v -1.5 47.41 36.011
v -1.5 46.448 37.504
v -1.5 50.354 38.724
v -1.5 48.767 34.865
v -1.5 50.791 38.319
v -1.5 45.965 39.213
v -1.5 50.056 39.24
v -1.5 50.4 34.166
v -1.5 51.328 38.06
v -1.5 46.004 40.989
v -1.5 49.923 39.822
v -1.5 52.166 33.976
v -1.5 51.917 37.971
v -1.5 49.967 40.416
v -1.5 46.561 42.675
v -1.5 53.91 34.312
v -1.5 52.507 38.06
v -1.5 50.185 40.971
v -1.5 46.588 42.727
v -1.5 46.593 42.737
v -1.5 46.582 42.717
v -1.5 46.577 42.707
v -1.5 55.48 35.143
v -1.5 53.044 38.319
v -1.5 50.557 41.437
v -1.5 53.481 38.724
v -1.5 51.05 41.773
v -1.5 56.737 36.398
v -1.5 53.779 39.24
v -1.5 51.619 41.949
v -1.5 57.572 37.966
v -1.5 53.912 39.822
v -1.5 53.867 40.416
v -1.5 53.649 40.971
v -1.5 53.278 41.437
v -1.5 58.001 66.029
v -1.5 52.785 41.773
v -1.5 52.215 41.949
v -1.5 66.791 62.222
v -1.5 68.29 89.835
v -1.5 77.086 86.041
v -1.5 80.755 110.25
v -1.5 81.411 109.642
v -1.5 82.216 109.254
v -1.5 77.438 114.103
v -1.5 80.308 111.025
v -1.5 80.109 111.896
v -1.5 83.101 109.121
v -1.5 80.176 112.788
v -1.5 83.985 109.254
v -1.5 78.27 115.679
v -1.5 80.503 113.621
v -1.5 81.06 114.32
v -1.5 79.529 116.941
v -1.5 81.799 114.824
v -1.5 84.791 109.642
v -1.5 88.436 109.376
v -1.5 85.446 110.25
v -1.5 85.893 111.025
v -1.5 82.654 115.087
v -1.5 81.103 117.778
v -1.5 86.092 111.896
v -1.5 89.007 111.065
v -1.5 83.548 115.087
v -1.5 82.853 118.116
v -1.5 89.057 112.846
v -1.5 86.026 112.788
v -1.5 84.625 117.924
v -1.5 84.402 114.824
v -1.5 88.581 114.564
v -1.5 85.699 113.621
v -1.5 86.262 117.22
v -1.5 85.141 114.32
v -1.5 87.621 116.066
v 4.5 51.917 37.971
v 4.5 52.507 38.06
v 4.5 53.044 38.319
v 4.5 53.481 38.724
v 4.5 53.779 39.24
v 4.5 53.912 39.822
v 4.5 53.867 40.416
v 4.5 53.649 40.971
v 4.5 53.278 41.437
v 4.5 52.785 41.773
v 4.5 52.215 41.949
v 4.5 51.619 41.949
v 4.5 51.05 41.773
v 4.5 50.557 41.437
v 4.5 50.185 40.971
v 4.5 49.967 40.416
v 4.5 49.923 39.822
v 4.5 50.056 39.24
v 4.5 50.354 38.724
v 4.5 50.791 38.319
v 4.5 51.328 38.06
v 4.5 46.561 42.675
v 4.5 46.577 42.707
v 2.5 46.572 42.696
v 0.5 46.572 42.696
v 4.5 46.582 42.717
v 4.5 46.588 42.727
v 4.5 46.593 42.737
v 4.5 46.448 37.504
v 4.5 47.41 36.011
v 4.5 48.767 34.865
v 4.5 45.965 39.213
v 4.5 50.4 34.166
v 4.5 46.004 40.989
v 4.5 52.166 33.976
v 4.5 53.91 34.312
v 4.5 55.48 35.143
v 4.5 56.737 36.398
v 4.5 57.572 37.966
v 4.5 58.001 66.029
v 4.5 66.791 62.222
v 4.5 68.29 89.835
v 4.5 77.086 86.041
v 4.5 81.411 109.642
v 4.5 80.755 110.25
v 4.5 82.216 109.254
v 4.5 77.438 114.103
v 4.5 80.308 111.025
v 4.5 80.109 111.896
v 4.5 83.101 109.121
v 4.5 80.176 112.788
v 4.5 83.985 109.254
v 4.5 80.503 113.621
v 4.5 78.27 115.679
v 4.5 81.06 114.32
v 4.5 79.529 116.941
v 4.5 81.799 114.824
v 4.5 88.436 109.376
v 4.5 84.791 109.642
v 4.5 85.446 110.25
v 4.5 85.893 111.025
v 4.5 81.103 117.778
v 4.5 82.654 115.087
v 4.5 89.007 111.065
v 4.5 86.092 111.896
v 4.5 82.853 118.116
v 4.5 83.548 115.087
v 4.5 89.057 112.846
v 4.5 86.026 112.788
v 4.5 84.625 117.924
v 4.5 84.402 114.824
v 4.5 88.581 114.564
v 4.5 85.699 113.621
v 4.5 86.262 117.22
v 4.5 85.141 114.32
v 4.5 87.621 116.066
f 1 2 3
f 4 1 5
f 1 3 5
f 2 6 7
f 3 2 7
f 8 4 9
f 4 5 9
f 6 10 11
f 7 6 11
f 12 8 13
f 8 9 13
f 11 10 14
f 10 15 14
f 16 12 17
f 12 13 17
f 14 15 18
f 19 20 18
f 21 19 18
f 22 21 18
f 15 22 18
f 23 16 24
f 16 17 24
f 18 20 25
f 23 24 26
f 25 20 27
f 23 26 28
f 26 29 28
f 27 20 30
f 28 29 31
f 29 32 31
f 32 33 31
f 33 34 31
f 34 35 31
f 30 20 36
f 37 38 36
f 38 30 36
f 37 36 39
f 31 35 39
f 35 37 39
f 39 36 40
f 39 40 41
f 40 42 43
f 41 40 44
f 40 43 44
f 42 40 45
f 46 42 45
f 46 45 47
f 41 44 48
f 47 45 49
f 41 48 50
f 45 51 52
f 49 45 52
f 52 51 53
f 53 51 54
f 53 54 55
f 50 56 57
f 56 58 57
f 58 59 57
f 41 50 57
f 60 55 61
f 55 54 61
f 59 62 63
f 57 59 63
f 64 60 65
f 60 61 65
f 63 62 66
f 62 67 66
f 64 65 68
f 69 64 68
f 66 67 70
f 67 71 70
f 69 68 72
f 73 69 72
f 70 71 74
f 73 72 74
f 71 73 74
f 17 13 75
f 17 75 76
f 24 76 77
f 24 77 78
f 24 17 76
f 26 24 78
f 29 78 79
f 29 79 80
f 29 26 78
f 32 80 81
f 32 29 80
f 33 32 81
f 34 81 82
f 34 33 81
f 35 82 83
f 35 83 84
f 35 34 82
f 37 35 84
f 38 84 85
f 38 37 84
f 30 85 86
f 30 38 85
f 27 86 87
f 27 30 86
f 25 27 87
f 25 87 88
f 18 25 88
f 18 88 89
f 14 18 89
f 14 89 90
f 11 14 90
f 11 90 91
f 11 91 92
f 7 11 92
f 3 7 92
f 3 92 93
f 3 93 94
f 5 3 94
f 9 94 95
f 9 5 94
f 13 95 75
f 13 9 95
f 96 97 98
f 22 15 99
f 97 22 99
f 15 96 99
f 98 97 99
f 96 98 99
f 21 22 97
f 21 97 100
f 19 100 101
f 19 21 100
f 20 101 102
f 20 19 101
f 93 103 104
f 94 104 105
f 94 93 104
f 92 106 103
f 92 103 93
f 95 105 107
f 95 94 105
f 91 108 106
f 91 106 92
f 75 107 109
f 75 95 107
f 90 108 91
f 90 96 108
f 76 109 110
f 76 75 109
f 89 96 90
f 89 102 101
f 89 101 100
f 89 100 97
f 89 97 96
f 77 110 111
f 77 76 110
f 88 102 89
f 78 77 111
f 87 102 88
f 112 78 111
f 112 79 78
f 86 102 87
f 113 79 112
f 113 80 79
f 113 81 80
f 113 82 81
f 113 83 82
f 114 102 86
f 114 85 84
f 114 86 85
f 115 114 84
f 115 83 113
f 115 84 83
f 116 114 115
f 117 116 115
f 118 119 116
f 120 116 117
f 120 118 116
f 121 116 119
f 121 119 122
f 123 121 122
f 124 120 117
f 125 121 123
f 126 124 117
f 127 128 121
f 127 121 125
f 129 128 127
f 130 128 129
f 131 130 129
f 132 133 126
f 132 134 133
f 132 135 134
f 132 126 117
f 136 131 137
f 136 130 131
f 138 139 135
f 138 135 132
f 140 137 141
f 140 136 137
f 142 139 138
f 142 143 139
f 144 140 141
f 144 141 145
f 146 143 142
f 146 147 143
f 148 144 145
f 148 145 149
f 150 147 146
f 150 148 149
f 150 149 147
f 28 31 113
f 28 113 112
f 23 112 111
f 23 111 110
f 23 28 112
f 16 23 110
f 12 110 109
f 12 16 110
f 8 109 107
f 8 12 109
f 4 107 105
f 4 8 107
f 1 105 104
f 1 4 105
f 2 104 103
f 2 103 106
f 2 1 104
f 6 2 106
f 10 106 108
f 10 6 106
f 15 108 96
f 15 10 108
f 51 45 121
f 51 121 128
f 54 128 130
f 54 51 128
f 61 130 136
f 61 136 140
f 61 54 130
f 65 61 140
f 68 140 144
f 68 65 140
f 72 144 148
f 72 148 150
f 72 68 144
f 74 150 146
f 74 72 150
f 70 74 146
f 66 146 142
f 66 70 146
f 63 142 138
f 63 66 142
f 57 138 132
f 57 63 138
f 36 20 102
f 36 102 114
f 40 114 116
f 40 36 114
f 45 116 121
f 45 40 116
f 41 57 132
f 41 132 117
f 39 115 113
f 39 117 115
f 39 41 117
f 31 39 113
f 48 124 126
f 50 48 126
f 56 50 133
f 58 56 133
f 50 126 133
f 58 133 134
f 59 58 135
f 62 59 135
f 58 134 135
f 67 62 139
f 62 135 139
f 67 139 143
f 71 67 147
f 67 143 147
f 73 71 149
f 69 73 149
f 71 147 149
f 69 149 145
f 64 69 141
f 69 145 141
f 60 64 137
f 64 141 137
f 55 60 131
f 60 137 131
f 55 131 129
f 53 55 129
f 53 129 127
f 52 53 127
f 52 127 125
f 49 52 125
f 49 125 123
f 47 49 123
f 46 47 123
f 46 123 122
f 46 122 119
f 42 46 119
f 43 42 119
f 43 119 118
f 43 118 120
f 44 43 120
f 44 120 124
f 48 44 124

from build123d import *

# Parameters (mm, degrees)
SKETCH2_R               = 1.375
SKETCH2_R_2             = 1
BOSS_EXTRUDE1_DEPTH     = 3
SCALE1_SCALE            = 2
SKETCH3_R               = 3
CUT_EXTRUDE1_DEPTH      = 168.69505013
CUT_EXTRUDE2_DEPTH      = 168.69505013
CUT_EXTRUDE2_DEPTH_BACK = 168.69505013


with BuildPart() as part:
    # Sketch2 → Boss-Extrude1 (new body)
    with BuildSketch(Plane.YZ):
        with BuildLine():
            ThreePointArc((52.261817642, 64.649681199), (55.722453046, 48.775220907), (69.655917155, 57.131838936))
            ThreePointArc((69.655917155, 57.131838936), (73.702355413, 73.305037878), (82.709556836, 87.334162909))
            ThreePointArc((82.709556836, 87.334162909), (79.248921432, 103.208623201), (65.315457322, 94.852005173))
            ThreePointArc((65.315457322, 94.852005173), (61.269019064, 78.67880623), (52.261817642, 64.649681199))
        make_face()
        with Locations(Location((75.281557454, 94.029297351, 0), (0, 0, 270))):
            Circle(SKETCH2_R, mode=Mode.SUBTRACT)
        with Locations(Location((59.689817023, 57.954546758, 0), (0, 0, 270))):
            Circle(SKETCH2_R_2, mode=Mode.SUBTRACT)
    extrude(amount=BOSS_EXTRUDE1_DEPTH)


with BuildPart() as part_1:
    # Scale1: scaled about (1.5, 67.462360836, 75.937951546)
    add(part.part.scale(SCALE1_SCALE).moved(Location((-1.5, -67.462360836, -75.937951546))))

    # Sketch3 → Cut-Extrude1 (cut, through all)
    with BuildSketch(Plane.YZ.offset(4.5)):
        with Locations(Location((83.100754073, 112.120643155, 0), (0, 0, 270))):
            Circle(SKETCH3_R)
    extrude(amount=-CUT_EXTRUDE1_DEPTH, mode=Mode.SUBTRACT)

    # Sketch4 → Cut-Extrude2 (cut, two sides: drawn at the far end of the back side and taken through both)
    with BuildSketch(Plane.YZ.offset(4.5).offset(-CUT_EXTRUDE2_DEPTH_BACK)):
        with BuildLine():
            ThreePointArc((63.168553809, 113.7660588), (55.075677293, 81.419660915), (37.061274447, 53.361410853))
            ThreePointArc((37.061274447, 53.361410853), (43.982545256, 21.612490269), (71.849473474, 38.325726326))
            ThreePointArc((71.849473474, 38.325726326), (79.94234999, 70.672124211), (97.956752836, 98.730374273))
            ThreePointArc((97.956752836, 98.730374273), (91.035482027, 130.479294857), (63.168553809, 113.7660588))
        make_face()
        with BuildLine():
            ThreePointArc((77.437713, 114.103057293), (85.469954791, 117.633073469), (88.436192443, 109.375994289))
            ThreePointArc((88.436192443, 109.375994289), (71.804815123, 74.18921939), (57.57219549, 37.96568591))
            ThreePointArc((57.57219549, 37.96568591), (49.557643799, 34.454607819), (46.56128374, 42.675467541))
            add(Edge.make_bspline(
                [(46.57708347, 42.706756435), (46.571822916, 42.696339697), (46.566556342, 42.685910072), (46.56128374, 42.675467541)],
                knots=[0.950044559, 0.950044559, 0.950044559, 0.950044559, 0.950284721, 0.950284721, 0.950284721, 0.950284721], degree=3))
            ThreePointArc((46.57708347, 42.706756435), (46.585069243, 42.722124357), (46.593054528, 42.737492531))
            ThreePointArc((46.593054528, 42.737492531), (63.286743628, 77.87078496), (77.437713, 114.103057293))
        make_face(mode=Mode.SUBTRACT)
    extrude(amount=CUT_EXTRUDE2_DEPTH + CUT_EXTRUDE2_DEPTH_BACK, mode=Mode.SUBTRACT)


solid = part_1.part
